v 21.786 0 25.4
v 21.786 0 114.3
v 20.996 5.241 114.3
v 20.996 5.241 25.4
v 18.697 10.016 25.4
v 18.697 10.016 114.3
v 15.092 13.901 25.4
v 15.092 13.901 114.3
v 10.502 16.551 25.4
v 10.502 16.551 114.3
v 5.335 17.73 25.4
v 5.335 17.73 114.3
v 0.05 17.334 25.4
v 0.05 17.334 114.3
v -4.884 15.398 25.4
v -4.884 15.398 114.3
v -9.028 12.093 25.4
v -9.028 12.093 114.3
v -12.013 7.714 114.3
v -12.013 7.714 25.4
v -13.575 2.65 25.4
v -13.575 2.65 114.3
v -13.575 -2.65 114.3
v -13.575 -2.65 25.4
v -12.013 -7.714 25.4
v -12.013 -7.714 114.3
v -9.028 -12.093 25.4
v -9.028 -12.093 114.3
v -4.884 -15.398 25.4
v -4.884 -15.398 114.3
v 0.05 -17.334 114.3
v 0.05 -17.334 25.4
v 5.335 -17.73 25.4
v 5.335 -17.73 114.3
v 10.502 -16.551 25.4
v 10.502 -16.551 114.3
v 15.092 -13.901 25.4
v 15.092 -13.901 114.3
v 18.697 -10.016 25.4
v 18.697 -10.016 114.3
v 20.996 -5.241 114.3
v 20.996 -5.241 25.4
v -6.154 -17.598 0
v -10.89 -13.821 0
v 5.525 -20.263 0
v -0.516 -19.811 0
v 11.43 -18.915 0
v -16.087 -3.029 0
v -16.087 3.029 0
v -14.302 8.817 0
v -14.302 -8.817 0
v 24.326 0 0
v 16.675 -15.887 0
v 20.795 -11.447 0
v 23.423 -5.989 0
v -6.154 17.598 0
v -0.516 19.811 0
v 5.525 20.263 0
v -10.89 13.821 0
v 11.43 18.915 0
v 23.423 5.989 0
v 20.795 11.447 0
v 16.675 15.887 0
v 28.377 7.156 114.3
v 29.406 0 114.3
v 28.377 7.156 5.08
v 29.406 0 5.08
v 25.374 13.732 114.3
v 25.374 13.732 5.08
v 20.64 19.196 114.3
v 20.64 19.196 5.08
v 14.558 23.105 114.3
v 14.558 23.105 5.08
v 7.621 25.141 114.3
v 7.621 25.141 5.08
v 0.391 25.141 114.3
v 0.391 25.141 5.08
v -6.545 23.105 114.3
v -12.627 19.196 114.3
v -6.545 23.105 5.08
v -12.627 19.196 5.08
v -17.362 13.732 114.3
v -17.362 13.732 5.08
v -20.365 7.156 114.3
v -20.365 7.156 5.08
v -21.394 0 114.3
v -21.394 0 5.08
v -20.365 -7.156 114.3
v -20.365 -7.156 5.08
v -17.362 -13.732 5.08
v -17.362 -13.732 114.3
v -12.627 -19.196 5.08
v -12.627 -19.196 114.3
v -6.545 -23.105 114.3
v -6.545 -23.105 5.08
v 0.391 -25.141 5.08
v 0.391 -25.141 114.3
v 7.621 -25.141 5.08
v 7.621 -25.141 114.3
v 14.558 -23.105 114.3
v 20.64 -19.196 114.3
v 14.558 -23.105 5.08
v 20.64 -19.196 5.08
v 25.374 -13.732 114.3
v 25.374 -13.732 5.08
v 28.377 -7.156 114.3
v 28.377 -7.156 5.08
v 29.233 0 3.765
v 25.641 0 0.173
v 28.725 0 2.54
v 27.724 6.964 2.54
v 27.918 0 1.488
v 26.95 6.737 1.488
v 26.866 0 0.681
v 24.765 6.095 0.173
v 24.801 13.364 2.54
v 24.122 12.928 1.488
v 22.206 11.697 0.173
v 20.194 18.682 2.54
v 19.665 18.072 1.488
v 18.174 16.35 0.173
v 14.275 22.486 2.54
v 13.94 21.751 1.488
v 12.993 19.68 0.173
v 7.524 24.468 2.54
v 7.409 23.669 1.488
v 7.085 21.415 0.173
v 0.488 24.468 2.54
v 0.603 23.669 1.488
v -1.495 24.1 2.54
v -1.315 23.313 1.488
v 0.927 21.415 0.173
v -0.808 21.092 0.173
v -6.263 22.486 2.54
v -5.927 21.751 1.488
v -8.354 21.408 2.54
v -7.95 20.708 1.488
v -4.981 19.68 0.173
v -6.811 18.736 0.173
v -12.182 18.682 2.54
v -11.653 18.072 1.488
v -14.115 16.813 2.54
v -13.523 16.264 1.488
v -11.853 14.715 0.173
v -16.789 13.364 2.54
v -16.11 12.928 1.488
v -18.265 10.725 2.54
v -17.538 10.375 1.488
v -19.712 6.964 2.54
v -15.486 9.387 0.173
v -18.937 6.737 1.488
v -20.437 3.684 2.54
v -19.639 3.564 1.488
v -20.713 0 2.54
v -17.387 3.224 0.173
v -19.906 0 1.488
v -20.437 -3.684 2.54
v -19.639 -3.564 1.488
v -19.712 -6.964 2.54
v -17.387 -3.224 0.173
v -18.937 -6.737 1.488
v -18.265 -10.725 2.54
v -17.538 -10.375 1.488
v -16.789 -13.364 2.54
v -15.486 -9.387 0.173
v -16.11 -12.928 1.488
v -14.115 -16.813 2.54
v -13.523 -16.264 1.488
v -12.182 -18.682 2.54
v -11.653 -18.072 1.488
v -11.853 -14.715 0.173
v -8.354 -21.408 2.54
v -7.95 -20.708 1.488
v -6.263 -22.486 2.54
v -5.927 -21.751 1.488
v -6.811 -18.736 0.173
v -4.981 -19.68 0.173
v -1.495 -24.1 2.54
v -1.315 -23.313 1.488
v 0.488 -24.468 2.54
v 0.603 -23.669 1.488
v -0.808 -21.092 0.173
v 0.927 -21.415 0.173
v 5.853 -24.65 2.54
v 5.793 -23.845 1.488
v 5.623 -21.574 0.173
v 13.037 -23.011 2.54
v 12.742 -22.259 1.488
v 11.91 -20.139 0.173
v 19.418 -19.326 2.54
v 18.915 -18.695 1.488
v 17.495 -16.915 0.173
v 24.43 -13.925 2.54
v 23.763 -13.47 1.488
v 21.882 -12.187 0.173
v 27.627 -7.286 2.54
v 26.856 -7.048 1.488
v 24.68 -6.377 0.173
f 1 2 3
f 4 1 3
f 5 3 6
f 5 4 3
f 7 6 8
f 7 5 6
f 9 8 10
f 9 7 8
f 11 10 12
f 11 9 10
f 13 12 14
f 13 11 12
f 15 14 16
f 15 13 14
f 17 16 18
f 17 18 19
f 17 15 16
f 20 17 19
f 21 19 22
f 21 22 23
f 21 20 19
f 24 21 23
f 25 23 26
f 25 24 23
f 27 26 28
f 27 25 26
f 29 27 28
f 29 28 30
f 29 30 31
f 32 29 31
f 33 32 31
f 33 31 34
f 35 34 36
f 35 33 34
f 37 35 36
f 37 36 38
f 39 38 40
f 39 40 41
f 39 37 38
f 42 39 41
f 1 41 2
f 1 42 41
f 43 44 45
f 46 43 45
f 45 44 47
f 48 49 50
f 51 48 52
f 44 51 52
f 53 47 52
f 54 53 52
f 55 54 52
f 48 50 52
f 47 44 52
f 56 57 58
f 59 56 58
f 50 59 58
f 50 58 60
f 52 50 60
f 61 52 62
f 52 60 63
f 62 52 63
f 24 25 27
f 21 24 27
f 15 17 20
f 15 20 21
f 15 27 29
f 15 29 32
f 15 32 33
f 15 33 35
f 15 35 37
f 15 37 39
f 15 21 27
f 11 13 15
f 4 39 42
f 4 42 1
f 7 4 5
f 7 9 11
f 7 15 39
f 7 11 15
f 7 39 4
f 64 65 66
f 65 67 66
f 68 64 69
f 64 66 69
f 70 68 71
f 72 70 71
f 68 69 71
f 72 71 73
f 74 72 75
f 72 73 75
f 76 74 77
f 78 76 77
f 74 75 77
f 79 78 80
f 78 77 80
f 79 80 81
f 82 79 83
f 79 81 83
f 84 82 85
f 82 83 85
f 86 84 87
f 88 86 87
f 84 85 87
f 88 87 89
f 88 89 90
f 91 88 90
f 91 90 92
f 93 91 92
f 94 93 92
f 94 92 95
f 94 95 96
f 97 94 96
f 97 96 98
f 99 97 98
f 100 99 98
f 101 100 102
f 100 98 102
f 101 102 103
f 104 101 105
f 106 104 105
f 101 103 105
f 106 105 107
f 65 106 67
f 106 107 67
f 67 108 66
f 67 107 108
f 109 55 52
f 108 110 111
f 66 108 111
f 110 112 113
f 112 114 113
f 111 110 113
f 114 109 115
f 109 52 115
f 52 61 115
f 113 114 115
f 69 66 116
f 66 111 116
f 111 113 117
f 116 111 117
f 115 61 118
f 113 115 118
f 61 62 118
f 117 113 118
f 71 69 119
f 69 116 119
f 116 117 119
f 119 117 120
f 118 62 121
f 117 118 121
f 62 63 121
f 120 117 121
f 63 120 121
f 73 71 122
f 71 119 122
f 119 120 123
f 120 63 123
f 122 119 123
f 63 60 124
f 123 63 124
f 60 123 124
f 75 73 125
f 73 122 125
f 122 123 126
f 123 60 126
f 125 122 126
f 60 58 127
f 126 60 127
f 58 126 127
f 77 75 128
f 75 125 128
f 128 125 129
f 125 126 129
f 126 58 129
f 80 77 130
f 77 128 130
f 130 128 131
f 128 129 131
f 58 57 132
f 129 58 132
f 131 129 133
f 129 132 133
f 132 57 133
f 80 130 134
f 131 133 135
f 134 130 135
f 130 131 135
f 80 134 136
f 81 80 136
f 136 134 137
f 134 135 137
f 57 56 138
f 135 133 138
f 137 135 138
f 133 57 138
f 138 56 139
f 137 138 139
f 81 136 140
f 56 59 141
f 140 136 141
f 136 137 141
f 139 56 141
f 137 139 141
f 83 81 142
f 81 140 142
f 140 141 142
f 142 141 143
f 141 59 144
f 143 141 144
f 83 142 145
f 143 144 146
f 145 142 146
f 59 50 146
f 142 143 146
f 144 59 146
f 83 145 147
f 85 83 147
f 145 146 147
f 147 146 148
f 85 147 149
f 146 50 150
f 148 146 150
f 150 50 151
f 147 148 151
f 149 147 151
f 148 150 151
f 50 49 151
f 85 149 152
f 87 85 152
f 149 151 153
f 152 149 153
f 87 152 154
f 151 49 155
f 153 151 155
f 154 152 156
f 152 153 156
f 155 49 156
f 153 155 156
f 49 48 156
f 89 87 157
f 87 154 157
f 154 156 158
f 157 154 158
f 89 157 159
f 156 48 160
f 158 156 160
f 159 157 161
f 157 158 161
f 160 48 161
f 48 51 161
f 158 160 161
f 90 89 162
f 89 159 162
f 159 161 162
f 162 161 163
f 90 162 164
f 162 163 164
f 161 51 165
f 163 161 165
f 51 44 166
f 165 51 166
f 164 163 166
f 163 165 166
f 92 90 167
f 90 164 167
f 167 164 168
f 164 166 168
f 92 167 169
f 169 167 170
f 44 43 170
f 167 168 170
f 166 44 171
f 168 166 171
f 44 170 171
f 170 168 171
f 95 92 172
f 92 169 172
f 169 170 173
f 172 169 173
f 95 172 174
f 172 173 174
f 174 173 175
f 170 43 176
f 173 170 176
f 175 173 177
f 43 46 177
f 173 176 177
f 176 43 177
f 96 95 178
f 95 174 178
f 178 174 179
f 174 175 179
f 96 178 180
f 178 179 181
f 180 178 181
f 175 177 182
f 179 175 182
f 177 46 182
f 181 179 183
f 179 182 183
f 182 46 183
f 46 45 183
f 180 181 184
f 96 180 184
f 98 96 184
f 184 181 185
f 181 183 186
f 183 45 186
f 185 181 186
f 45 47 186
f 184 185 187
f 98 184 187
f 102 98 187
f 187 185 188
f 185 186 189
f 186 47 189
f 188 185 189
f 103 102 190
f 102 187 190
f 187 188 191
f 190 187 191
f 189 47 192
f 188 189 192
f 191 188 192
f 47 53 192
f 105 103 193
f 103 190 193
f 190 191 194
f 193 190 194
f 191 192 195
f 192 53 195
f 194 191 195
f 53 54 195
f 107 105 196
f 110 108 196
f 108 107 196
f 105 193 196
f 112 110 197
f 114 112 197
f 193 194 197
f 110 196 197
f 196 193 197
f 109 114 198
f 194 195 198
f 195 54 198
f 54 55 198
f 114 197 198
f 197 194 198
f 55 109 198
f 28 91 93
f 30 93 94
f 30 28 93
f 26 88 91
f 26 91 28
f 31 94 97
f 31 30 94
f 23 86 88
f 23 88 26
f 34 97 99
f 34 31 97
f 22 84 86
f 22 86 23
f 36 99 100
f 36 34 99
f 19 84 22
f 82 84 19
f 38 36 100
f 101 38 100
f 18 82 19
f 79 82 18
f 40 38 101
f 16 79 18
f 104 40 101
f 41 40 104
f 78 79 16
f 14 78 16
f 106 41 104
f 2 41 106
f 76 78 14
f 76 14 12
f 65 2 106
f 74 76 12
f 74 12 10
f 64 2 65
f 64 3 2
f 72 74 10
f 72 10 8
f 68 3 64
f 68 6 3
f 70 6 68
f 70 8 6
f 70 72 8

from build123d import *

# Parameters (mm, degrees)
F0_R     = 25.4
F1_DEPTH = 76.2
F2_R     = 5.08
F3_R     = 17.78
F4_DEPTH = 50.8
F5_DEPTH = 38.1


with BuildPart() as f1:
    # F0 (on Top) → F1 (new body)
    with BuildSketch(Plane.XY):
        with Locations((4.0060626761, 0)):
            Circle(F0_R)
    extrude(amount=F1_DEPTH)

    # F2
    f2_edges = [f1.edges().sort_by_distance(p)[0] for p in [
        (-21.393937, 0, 0),
    ]]
    fillet(f2_edges, radius=F2_R)

    # F3 (on face) → F4 (cut)
    with BuildSketch(Plane.XY.offset(76.2)):
        with Locations((4.0060626761, 0)):
            Circle(F3_R)
    extrude(amount=-F4_DEPTH, mode=Mode.SUBTRACT)

    # F5 (add): a face of the model
    f5_faces = [f1.faces().sort_by_distance(p)[0] for p in [
        (-20.6755168342, 0, 76.2),
    ]]
    extrude(f5_faces, amount=F5_DEPTH)


solid = f1.part
